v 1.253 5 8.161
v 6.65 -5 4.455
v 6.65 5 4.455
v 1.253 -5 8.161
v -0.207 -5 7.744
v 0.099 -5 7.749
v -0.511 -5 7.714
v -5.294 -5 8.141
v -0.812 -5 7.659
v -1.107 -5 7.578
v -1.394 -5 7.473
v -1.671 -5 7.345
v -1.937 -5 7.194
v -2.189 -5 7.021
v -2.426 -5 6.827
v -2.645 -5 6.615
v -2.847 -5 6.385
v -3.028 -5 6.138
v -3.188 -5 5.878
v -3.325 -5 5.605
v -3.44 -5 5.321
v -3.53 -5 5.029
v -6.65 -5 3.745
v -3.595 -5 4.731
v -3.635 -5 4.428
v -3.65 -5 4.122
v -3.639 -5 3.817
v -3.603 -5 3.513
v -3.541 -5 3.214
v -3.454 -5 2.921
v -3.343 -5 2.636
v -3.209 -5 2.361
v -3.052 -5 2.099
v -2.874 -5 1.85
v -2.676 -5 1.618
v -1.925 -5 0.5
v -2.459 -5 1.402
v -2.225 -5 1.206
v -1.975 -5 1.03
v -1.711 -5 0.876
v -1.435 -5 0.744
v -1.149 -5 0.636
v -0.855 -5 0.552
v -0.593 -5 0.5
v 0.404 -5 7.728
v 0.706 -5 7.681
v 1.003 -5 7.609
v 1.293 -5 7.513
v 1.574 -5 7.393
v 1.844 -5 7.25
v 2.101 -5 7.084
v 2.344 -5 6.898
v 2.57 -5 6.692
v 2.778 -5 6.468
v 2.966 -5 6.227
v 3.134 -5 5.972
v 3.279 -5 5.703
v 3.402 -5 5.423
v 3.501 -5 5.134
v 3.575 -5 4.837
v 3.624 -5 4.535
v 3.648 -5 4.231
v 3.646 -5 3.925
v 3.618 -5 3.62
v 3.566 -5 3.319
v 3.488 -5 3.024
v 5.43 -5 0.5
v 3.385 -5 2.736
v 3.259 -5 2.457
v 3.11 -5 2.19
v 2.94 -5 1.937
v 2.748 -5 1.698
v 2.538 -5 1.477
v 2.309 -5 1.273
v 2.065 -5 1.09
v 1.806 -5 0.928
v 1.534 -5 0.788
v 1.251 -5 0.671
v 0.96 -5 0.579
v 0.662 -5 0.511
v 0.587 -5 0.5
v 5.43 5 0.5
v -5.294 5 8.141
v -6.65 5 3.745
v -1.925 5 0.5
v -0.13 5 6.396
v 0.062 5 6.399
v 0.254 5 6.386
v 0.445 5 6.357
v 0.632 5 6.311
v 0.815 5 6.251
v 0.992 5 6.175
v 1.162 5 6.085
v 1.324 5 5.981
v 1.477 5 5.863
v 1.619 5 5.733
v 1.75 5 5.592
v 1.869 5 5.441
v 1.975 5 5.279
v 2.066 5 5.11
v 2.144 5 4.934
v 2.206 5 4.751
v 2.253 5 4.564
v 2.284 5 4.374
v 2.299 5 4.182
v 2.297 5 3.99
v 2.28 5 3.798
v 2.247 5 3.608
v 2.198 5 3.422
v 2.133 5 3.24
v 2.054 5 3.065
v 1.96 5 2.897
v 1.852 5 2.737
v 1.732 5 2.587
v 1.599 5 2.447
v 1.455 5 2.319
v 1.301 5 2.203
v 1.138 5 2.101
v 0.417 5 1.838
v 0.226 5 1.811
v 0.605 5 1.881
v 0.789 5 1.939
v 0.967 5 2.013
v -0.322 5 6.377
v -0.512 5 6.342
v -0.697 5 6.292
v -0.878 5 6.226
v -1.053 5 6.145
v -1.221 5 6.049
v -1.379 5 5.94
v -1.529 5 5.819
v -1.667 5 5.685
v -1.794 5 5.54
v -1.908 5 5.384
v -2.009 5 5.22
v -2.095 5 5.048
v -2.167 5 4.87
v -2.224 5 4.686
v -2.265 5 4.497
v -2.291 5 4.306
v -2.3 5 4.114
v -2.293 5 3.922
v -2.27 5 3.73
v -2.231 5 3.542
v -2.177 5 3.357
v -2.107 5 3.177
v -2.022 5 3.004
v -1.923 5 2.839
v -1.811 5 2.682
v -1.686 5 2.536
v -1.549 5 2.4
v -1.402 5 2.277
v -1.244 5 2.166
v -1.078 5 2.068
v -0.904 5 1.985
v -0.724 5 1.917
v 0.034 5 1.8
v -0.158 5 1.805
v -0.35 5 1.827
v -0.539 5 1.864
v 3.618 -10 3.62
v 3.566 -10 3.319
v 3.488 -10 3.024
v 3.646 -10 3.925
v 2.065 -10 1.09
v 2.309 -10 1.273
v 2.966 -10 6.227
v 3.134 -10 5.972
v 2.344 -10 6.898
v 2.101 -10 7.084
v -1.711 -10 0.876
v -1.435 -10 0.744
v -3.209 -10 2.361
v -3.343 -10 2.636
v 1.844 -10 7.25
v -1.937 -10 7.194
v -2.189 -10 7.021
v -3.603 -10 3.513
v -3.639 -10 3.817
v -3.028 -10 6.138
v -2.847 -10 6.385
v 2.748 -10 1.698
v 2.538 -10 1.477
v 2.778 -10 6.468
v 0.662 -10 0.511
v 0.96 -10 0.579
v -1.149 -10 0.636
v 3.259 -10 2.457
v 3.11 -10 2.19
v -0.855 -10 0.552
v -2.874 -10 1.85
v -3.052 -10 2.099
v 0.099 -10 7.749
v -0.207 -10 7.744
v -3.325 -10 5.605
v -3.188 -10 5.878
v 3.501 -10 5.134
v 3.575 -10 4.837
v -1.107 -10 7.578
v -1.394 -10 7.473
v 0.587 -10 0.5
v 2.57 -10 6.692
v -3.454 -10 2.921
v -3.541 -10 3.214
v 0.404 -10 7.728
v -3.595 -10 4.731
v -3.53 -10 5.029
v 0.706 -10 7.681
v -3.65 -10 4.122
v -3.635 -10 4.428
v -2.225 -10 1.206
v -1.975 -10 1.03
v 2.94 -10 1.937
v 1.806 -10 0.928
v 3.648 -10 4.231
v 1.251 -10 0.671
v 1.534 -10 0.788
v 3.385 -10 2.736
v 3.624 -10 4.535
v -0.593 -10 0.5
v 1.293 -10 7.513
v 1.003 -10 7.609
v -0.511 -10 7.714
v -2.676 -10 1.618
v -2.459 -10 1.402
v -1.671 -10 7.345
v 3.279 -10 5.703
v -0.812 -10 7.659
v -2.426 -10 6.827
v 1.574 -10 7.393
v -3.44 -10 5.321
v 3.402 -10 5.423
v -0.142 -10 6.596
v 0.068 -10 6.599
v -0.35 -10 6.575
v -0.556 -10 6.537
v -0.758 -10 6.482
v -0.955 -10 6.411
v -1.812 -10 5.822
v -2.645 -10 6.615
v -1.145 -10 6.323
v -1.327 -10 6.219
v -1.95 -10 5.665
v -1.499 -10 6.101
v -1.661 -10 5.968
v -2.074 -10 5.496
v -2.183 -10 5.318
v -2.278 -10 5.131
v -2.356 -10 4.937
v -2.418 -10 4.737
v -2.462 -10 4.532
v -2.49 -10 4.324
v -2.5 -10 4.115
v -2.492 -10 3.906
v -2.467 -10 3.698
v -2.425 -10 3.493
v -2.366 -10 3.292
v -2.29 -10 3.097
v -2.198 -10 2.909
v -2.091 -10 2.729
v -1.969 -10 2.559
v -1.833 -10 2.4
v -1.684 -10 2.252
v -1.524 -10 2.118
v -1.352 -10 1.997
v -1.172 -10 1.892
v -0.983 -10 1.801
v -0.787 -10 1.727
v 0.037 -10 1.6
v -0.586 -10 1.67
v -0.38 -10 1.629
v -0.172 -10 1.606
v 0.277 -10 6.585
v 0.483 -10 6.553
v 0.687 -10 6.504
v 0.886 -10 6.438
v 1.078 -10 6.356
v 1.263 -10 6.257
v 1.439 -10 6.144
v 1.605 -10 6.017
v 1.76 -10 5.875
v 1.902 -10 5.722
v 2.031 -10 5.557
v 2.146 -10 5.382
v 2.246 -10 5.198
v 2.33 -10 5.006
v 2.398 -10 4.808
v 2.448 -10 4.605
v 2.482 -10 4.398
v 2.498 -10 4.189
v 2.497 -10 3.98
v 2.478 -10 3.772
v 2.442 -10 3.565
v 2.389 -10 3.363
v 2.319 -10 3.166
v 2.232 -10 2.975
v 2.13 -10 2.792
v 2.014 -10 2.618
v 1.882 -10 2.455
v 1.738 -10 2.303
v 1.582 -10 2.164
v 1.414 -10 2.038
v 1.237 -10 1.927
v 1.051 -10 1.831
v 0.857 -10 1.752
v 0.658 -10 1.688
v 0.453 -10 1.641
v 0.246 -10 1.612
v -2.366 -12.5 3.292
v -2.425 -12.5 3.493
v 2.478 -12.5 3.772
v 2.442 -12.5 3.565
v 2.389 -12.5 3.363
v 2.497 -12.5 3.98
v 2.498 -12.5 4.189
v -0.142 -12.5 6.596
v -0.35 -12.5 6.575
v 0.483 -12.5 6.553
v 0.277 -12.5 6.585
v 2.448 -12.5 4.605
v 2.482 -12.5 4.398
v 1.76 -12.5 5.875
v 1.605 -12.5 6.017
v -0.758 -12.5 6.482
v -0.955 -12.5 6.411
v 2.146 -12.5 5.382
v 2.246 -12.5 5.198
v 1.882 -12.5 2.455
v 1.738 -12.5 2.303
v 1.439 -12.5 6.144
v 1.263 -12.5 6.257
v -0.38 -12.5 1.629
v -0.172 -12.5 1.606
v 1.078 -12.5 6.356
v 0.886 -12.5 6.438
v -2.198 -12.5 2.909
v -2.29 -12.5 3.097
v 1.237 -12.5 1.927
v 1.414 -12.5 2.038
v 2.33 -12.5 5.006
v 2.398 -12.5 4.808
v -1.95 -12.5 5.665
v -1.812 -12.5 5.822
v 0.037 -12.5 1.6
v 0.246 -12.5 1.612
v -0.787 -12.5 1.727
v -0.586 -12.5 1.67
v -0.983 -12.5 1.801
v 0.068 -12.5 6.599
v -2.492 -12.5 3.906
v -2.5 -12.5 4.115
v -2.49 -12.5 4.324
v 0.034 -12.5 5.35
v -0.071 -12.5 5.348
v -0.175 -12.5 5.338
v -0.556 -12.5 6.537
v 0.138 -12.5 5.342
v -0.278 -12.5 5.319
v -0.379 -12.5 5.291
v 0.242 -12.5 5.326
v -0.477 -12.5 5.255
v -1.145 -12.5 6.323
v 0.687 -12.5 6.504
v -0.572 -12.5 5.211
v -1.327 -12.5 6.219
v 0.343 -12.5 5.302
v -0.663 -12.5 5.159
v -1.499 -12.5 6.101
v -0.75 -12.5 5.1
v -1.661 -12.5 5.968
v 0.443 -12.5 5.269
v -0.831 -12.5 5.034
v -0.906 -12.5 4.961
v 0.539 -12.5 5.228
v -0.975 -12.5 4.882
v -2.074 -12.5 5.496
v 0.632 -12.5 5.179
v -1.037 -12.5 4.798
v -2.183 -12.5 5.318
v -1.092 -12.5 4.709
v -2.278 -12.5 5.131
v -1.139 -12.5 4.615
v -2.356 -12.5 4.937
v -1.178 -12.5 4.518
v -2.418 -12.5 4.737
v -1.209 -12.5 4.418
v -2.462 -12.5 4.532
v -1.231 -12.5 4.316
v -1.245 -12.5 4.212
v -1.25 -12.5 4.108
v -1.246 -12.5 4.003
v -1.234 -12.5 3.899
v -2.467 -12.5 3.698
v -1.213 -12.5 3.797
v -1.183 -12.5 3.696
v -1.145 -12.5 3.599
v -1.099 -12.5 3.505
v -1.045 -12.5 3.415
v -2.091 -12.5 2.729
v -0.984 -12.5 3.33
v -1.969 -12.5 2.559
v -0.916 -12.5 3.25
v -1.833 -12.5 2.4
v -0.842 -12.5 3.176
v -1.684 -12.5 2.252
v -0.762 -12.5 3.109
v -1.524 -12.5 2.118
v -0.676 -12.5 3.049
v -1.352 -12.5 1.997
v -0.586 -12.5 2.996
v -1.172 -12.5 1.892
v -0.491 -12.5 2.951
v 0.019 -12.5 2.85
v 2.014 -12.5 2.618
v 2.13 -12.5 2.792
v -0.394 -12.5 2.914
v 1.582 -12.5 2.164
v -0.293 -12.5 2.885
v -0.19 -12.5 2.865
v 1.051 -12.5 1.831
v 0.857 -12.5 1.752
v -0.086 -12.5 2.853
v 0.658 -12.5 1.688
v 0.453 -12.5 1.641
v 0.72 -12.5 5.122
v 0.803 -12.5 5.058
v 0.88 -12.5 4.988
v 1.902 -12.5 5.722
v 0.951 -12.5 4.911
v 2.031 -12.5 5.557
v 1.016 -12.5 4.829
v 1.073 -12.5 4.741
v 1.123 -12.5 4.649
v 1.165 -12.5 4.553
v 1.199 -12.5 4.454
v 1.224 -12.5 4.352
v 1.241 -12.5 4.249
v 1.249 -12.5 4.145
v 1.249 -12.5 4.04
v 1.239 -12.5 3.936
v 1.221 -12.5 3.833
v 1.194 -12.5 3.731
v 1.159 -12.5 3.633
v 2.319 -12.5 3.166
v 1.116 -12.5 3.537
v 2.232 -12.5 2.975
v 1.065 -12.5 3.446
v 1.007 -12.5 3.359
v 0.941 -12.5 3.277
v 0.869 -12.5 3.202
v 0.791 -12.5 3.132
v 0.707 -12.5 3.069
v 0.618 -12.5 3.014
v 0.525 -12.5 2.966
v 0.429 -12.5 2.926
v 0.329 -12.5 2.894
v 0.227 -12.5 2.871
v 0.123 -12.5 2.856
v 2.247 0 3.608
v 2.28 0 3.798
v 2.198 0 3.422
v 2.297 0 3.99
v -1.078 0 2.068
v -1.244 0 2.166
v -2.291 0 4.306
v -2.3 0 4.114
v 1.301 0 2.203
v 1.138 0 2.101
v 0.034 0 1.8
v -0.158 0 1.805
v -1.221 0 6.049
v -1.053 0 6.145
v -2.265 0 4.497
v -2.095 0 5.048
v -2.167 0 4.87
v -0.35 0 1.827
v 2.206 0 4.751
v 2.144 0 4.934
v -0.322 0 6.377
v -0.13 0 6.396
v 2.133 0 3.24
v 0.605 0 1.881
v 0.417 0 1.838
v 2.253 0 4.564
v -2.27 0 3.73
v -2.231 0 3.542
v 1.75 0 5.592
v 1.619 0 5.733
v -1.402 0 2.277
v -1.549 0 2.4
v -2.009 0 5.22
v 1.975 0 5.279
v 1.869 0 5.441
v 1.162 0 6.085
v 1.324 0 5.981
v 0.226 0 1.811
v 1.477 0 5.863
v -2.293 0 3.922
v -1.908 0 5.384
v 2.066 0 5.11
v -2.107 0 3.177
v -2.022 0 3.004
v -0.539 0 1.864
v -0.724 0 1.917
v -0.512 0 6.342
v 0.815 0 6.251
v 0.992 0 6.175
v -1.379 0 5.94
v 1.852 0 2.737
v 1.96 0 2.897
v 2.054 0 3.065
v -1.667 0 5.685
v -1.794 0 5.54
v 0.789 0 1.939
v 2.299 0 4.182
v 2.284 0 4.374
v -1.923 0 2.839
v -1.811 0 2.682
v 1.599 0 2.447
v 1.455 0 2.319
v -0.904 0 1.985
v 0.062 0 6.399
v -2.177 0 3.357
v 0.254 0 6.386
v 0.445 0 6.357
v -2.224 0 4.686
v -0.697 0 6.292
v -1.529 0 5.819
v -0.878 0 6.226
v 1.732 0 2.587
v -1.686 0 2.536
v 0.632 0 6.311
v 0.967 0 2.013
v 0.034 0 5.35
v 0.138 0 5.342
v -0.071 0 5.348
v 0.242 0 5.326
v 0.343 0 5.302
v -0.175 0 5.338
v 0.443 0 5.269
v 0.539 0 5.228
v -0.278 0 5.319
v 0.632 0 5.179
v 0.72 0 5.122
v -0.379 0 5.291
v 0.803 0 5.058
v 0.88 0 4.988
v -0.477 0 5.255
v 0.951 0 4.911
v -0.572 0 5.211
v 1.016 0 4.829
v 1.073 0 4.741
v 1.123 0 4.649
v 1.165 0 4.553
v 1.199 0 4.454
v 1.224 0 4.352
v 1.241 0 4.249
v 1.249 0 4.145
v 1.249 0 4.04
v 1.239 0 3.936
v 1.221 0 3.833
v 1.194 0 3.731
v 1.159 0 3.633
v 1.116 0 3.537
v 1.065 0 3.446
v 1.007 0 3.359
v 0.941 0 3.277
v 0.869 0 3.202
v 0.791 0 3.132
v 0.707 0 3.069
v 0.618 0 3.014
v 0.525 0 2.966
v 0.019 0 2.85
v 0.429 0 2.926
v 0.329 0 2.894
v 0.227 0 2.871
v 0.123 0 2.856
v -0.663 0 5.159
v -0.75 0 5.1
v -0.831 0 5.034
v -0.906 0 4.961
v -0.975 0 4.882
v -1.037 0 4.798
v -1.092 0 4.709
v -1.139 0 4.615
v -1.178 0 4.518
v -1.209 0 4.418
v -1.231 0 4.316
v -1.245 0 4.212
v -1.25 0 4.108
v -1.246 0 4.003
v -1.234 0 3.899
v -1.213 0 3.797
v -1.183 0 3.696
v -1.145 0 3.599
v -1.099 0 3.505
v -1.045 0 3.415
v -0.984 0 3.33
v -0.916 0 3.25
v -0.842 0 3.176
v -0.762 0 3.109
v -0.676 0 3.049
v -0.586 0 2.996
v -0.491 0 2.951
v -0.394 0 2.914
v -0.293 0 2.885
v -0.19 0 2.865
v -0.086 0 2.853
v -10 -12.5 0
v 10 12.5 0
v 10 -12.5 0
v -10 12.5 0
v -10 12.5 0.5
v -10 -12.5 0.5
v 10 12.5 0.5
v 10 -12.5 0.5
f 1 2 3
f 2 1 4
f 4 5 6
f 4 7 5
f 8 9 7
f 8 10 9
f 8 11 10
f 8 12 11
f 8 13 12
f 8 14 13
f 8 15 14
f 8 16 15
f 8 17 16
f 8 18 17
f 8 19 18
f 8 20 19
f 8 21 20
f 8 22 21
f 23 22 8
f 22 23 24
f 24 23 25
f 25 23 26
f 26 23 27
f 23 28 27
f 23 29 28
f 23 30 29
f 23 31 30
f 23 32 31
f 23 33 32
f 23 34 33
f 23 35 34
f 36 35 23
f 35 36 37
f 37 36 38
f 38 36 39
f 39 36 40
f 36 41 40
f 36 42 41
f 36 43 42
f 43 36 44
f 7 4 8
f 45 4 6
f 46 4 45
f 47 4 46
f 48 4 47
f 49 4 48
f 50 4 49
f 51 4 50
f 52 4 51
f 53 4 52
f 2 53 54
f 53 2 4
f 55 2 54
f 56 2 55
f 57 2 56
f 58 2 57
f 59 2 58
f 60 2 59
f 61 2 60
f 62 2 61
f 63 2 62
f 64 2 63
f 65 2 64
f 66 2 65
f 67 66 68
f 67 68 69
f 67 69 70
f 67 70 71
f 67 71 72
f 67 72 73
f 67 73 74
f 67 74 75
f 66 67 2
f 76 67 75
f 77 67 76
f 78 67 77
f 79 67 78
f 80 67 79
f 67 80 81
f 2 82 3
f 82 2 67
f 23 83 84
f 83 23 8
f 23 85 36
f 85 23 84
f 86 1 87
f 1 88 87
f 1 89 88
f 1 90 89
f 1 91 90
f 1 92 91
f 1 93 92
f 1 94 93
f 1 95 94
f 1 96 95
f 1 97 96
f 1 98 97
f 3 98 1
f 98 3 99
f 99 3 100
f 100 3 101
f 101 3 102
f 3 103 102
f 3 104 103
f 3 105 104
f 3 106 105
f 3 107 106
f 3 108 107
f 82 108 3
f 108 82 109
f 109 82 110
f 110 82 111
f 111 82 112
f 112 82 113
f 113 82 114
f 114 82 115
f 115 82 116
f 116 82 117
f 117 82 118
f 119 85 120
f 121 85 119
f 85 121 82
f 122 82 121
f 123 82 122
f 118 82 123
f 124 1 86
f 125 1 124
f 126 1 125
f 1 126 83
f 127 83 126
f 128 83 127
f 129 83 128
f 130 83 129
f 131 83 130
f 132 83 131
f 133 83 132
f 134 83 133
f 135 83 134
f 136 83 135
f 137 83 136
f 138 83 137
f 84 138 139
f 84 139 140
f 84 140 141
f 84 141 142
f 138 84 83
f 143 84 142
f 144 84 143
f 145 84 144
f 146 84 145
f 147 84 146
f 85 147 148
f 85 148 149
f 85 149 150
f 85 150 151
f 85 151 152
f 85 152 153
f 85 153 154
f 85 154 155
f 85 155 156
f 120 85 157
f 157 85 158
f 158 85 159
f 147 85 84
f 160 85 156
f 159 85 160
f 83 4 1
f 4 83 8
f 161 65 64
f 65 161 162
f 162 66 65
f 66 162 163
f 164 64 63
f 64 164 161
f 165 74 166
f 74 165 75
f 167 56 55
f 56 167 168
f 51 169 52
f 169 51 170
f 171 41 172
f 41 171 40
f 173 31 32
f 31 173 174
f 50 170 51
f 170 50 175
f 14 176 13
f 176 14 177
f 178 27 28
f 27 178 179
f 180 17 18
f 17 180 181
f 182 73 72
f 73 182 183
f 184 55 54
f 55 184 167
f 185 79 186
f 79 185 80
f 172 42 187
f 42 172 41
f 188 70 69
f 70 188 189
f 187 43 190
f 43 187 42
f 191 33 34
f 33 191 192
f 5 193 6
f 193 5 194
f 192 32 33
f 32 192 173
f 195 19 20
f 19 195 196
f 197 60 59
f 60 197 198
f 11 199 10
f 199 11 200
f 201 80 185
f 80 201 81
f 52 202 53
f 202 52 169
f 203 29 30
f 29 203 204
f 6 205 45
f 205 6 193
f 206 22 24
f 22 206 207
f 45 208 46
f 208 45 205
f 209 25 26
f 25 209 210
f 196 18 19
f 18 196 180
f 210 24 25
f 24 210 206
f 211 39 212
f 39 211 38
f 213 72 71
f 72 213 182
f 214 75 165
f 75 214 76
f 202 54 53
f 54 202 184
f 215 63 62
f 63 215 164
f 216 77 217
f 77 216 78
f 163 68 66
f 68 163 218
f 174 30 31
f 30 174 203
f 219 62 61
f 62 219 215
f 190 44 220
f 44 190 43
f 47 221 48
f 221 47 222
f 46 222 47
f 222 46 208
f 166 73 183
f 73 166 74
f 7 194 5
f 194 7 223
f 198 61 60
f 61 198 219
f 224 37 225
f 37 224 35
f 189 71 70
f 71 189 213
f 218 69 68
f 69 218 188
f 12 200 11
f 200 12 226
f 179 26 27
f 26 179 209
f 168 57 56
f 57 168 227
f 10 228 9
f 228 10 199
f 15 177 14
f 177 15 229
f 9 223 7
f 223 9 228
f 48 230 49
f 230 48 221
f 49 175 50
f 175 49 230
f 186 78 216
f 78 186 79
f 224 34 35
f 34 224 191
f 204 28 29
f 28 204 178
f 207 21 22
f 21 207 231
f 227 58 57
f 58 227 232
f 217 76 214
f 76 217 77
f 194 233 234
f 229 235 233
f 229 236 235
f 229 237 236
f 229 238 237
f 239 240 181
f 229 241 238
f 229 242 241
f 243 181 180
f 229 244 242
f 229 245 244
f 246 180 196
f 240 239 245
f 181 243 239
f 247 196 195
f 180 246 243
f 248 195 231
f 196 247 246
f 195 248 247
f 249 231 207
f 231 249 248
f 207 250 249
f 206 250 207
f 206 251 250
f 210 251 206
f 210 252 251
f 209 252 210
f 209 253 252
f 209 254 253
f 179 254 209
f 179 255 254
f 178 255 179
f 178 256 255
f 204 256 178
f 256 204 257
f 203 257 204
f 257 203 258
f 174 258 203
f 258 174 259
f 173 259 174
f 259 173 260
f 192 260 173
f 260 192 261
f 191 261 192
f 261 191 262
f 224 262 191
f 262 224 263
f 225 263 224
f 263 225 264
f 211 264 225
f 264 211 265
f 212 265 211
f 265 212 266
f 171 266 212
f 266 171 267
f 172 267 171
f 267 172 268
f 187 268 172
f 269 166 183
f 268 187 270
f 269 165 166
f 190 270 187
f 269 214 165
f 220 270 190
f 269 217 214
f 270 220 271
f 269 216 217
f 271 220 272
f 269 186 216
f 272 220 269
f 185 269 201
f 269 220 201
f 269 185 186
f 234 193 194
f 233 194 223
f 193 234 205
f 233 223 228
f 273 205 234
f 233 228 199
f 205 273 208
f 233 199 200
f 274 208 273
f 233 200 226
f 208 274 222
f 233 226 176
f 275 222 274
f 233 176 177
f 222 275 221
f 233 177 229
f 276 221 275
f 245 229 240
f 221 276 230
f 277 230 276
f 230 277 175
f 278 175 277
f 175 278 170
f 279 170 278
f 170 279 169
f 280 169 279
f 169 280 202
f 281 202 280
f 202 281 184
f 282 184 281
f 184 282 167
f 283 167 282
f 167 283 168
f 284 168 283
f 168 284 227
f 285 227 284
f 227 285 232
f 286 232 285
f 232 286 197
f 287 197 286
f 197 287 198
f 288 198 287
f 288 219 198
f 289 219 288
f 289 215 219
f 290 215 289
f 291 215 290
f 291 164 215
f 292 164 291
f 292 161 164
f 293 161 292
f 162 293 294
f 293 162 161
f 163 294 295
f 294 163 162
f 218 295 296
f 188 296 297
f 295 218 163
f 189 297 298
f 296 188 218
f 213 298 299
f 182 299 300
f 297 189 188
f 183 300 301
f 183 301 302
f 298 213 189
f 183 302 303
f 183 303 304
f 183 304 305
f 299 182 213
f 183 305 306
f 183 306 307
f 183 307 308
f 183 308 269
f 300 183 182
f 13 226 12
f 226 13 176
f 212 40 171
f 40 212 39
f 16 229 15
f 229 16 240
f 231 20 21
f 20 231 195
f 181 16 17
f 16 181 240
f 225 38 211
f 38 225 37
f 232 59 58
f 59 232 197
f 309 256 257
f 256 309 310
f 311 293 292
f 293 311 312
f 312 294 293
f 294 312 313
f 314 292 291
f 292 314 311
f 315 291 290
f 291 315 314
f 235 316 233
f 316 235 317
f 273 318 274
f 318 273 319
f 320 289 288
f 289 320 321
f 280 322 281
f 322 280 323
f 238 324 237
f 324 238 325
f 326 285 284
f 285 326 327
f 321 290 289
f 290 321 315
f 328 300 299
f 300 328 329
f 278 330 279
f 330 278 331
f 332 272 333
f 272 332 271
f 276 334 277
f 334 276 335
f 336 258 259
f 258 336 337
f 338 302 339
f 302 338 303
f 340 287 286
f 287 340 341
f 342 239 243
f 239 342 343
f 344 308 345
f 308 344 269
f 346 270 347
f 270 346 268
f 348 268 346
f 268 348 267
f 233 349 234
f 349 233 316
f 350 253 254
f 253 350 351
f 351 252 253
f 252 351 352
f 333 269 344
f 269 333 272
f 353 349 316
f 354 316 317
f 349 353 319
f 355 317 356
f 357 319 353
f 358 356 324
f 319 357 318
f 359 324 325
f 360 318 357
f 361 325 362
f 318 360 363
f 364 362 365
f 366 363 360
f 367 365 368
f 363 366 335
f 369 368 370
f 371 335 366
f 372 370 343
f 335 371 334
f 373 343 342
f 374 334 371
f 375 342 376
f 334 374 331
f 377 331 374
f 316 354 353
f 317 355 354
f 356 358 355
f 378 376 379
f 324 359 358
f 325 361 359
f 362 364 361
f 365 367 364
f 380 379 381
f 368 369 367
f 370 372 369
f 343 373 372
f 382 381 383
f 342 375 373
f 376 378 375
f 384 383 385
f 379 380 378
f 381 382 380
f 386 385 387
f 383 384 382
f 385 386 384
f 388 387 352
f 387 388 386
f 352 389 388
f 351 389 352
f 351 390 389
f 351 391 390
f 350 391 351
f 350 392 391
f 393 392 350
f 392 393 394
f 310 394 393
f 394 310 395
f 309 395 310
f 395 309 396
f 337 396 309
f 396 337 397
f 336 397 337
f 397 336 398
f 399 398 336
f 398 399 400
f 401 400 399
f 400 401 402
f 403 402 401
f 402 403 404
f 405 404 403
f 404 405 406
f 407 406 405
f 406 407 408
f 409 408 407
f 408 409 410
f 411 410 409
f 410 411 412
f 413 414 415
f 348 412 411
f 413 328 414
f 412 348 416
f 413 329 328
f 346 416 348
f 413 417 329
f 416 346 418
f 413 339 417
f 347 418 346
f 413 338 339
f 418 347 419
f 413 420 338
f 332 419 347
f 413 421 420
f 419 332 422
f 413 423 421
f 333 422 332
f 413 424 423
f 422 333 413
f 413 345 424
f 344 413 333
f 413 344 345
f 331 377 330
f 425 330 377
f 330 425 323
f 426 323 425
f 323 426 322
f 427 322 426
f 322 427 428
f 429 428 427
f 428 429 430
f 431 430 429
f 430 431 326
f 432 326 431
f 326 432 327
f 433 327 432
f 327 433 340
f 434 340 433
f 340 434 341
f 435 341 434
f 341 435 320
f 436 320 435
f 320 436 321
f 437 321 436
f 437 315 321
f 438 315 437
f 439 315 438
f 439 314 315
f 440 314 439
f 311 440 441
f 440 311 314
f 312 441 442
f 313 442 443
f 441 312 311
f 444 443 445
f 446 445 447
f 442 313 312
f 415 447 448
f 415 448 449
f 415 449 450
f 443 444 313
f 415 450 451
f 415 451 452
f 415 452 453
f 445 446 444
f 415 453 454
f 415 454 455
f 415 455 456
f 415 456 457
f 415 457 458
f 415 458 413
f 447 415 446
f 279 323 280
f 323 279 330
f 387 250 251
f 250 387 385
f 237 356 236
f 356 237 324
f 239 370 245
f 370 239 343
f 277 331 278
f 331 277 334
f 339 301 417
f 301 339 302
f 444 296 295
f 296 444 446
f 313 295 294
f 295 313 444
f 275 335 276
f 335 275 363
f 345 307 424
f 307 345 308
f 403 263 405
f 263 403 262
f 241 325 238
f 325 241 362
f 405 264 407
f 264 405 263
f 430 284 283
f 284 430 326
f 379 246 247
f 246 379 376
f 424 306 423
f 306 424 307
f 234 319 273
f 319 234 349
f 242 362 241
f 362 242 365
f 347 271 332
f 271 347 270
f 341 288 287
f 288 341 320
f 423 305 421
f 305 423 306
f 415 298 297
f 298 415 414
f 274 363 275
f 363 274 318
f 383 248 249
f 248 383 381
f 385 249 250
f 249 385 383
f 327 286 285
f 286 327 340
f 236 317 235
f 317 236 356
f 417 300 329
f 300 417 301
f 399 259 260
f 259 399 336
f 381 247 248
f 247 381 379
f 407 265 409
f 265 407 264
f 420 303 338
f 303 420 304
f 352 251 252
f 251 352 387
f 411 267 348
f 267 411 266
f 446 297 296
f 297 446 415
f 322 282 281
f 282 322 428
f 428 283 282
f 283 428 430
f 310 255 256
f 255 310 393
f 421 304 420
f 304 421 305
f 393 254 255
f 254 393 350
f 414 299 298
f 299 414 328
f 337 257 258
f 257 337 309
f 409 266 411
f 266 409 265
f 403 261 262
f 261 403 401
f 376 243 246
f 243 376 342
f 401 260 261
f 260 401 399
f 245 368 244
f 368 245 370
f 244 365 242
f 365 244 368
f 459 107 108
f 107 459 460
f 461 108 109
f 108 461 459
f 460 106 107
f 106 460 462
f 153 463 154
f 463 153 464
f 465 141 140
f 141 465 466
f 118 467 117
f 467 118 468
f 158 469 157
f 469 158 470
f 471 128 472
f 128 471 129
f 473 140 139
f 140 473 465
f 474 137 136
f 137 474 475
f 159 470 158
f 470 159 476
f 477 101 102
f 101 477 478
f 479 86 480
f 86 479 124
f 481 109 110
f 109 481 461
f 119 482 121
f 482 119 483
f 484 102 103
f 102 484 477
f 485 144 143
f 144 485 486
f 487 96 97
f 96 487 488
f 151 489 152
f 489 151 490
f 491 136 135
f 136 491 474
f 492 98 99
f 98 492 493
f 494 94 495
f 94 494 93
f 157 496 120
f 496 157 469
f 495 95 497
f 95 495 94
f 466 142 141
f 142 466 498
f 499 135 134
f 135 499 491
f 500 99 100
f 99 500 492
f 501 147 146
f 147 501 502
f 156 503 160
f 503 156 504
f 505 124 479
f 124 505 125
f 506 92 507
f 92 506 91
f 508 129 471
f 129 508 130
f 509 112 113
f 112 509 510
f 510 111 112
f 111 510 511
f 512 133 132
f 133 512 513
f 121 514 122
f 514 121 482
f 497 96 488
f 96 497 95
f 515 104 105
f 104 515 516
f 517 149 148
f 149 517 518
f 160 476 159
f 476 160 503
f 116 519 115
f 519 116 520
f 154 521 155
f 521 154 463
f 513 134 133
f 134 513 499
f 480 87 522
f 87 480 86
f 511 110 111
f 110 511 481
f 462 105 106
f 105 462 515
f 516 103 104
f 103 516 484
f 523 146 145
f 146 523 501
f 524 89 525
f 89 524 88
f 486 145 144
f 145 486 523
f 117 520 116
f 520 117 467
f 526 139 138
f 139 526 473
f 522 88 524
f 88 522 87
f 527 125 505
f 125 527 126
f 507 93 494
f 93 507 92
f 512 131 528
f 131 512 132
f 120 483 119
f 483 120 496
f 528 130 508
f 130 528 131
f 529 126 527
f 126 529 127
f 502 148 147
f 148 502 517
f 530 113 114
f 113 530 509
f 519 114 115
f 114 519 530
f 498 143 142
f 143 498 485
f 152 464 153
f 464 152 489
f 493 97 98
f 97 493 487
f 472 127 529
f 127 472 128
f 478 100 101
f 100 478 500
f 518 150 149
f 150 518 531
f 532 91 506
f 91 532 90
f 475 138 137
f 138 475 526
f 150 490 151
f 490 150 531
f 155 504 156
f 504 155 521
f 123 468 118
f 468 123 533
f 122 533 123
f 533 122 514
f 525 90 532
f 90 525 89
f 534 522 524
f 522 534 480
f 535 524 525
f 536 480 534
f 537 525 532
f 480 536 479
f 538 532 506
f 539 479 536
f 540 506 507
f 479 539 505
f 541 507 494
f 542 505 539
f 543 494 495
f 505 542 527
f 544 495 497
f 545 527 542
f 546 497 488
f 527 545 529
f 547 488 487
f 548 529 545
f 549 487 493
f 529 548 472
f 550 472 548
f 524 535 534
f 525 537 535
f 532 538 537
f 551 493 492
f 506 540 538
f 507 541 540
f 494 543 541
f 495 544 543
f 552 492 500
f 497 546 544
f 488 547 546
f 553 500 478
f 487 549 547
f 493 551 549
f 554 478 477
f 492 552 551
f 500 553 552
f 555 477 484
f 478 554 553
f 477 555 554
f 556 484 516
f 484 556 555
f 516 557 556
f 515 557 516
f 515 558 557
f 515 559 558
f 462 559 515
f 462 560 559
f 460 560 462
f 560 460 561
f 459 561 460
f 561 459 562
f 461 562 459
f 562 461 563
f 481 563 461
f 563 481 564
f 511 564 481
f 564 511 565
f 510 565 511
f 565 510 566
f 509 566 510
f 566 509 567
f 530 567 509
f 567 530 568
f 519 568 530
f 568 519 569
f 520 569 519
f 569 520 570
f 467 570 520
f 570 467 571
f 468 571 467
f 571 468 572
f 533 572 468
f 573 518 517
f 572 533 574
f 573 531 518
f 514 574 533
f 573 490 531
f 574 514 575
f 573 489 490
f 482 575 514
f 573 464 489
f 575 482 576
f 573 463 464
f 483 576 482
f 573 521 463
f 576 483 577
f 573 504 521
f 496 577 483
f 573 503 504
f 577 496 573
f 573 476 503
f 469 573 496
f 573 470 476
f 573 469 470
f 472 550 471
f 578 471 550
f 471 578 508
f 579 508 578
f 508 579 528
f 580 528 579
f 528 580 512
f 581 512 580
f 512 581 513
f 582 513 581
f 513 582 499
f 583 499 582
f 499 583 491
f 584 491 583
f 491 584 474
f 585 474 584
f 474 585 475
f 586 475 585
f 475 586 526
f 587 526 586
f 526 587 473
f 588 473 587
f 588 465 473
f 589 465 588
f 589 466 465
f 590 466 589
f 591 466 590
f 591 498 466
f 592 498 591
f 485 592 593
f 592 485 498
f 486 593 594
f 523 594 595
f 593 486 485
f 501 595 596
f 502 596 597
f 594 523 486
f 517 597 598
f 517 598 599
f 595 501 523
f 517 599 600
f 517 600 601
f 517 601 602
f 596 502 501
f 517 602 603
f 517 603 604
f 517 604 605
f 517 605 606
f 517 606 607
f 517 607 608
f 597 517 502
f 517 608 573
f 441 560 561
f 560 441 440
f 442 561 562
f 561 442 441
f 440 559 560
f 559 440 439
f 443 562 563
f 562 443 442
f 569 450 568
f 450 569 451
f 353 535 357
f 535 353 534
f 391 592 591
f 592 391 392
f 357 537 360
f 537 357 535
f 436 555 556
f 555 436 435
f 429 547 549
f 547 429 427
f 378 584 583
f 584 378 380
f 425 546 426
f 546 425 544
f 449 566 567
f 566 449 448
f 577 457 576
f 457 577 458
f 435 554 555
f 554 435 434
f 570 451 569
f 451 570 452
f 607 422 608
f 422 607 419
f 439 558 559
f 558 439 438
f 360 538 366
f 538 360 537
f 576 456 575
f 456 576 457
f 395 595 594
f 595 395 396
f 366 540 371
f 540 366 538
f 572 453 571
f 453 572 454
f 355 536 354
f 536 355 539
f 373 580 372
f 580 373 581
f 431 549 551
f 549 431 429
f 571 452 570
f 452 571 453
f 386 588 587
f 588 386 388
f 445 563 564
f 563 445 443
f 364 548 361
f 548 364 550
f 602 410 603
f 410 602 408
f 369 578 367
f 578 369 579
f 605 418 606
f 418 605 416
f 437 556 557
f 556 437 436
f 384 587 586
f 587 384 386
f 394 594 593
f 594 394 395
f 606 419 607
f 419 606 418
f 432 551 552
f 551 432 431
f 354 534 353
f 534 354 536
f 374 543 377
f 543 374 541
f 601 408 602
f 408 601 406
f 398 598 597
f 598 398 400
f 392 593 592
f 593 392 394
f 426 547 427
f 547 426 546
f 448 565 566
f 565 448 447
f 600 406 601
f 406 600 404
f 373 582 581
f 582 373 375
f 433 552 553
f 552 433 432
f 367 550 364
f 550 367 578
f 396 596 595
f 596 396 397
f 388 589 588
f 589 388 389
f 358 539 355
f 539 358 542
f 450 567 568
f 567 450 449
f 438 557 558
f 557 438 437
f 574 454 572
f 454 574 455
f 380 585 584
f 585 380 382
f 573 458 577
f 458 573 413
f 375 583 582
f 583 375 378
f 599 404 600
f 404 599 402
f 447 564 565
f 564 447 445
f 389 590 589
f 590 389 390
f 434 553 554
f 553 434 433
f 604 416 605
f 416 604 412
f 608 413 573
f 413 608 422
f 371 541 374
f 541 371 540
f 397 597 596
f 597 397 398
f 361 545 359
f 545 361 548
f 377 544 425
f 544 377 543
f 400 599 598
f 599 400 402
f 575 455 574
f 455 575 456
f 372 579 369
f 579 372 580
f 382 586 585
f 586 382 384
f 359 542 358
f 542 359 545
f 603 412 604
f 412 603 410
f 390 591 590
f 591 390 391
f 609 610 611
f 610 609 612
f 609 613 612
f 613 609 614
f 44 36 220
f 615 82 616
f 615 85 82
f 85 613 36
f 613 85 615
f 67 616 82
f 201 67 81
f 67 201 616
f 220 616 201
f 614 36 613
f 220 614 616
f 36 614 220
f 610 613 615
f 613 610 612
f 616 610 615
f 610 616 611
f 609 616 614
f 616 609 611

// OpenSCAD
$fn = 75;

male_width = 12.5;
male_depth1 = 8.5;
male_depth2 = 4.6;

male_height = 10;

line_hole_d = 4.6;
line_hole_height = 5;

big_top_d = 7.3;
big_top_height = 5;

small_top_d = 5;
small_top_height = 2.5;

small_line_hole_d = 2.5;

translate([0, 0, 4.1])
rotate([90, 17.15, 0])
difference() {
    union() {
        male();
        big_top();
        small_top();
    };
    line_hole();
    small_line_hole();
};
linear_extrude(height=0.5)
square([male_height*2, male_width*2], center=true);

module male() {
    x = male_width/2;
    y1 = male_depth1/2;
    y2 = male_depth2/2;
    
    translate([0, 0, -male_height/2])
    linear_extrude(height=male_height)
    polygon(
        [
            [-x, y2],
            [0, y1],
            [x, y2],
            [x, -y2],
            [0, -y1],
            [-x, -y2]
        ]
    );
};

module line_hole() {
    translate([0, 0, -(male_height-line_hole_height)/2])
    cylinder(r1=line_hole_d/2, r2=line_hole_d/2, h=line_hole_height, center=true);
};

module small_line_hole() {
    height = male_height + big_top_height + small_top_height;
    translate([0, 0, (height-male_height)/2])
    cylinder(r1=small_line_hole_d/2, r2=small_line_hole_d/2, h=height, center=true);
};

module big_top() {
    translate([0, 0, (male_height+big_top_height)/2])
    cylinder(r1=big_top_d/2, r2=big_top_d/2, h=big_top_height, center=true);
};

module small_top() {
    translate([0, 0, (male_height+small_top_height)/2+big_top_height])
    cylinder(r1=small_top_d/2, r2=small_top_d/2, h=small_top_height, center=true);
};
